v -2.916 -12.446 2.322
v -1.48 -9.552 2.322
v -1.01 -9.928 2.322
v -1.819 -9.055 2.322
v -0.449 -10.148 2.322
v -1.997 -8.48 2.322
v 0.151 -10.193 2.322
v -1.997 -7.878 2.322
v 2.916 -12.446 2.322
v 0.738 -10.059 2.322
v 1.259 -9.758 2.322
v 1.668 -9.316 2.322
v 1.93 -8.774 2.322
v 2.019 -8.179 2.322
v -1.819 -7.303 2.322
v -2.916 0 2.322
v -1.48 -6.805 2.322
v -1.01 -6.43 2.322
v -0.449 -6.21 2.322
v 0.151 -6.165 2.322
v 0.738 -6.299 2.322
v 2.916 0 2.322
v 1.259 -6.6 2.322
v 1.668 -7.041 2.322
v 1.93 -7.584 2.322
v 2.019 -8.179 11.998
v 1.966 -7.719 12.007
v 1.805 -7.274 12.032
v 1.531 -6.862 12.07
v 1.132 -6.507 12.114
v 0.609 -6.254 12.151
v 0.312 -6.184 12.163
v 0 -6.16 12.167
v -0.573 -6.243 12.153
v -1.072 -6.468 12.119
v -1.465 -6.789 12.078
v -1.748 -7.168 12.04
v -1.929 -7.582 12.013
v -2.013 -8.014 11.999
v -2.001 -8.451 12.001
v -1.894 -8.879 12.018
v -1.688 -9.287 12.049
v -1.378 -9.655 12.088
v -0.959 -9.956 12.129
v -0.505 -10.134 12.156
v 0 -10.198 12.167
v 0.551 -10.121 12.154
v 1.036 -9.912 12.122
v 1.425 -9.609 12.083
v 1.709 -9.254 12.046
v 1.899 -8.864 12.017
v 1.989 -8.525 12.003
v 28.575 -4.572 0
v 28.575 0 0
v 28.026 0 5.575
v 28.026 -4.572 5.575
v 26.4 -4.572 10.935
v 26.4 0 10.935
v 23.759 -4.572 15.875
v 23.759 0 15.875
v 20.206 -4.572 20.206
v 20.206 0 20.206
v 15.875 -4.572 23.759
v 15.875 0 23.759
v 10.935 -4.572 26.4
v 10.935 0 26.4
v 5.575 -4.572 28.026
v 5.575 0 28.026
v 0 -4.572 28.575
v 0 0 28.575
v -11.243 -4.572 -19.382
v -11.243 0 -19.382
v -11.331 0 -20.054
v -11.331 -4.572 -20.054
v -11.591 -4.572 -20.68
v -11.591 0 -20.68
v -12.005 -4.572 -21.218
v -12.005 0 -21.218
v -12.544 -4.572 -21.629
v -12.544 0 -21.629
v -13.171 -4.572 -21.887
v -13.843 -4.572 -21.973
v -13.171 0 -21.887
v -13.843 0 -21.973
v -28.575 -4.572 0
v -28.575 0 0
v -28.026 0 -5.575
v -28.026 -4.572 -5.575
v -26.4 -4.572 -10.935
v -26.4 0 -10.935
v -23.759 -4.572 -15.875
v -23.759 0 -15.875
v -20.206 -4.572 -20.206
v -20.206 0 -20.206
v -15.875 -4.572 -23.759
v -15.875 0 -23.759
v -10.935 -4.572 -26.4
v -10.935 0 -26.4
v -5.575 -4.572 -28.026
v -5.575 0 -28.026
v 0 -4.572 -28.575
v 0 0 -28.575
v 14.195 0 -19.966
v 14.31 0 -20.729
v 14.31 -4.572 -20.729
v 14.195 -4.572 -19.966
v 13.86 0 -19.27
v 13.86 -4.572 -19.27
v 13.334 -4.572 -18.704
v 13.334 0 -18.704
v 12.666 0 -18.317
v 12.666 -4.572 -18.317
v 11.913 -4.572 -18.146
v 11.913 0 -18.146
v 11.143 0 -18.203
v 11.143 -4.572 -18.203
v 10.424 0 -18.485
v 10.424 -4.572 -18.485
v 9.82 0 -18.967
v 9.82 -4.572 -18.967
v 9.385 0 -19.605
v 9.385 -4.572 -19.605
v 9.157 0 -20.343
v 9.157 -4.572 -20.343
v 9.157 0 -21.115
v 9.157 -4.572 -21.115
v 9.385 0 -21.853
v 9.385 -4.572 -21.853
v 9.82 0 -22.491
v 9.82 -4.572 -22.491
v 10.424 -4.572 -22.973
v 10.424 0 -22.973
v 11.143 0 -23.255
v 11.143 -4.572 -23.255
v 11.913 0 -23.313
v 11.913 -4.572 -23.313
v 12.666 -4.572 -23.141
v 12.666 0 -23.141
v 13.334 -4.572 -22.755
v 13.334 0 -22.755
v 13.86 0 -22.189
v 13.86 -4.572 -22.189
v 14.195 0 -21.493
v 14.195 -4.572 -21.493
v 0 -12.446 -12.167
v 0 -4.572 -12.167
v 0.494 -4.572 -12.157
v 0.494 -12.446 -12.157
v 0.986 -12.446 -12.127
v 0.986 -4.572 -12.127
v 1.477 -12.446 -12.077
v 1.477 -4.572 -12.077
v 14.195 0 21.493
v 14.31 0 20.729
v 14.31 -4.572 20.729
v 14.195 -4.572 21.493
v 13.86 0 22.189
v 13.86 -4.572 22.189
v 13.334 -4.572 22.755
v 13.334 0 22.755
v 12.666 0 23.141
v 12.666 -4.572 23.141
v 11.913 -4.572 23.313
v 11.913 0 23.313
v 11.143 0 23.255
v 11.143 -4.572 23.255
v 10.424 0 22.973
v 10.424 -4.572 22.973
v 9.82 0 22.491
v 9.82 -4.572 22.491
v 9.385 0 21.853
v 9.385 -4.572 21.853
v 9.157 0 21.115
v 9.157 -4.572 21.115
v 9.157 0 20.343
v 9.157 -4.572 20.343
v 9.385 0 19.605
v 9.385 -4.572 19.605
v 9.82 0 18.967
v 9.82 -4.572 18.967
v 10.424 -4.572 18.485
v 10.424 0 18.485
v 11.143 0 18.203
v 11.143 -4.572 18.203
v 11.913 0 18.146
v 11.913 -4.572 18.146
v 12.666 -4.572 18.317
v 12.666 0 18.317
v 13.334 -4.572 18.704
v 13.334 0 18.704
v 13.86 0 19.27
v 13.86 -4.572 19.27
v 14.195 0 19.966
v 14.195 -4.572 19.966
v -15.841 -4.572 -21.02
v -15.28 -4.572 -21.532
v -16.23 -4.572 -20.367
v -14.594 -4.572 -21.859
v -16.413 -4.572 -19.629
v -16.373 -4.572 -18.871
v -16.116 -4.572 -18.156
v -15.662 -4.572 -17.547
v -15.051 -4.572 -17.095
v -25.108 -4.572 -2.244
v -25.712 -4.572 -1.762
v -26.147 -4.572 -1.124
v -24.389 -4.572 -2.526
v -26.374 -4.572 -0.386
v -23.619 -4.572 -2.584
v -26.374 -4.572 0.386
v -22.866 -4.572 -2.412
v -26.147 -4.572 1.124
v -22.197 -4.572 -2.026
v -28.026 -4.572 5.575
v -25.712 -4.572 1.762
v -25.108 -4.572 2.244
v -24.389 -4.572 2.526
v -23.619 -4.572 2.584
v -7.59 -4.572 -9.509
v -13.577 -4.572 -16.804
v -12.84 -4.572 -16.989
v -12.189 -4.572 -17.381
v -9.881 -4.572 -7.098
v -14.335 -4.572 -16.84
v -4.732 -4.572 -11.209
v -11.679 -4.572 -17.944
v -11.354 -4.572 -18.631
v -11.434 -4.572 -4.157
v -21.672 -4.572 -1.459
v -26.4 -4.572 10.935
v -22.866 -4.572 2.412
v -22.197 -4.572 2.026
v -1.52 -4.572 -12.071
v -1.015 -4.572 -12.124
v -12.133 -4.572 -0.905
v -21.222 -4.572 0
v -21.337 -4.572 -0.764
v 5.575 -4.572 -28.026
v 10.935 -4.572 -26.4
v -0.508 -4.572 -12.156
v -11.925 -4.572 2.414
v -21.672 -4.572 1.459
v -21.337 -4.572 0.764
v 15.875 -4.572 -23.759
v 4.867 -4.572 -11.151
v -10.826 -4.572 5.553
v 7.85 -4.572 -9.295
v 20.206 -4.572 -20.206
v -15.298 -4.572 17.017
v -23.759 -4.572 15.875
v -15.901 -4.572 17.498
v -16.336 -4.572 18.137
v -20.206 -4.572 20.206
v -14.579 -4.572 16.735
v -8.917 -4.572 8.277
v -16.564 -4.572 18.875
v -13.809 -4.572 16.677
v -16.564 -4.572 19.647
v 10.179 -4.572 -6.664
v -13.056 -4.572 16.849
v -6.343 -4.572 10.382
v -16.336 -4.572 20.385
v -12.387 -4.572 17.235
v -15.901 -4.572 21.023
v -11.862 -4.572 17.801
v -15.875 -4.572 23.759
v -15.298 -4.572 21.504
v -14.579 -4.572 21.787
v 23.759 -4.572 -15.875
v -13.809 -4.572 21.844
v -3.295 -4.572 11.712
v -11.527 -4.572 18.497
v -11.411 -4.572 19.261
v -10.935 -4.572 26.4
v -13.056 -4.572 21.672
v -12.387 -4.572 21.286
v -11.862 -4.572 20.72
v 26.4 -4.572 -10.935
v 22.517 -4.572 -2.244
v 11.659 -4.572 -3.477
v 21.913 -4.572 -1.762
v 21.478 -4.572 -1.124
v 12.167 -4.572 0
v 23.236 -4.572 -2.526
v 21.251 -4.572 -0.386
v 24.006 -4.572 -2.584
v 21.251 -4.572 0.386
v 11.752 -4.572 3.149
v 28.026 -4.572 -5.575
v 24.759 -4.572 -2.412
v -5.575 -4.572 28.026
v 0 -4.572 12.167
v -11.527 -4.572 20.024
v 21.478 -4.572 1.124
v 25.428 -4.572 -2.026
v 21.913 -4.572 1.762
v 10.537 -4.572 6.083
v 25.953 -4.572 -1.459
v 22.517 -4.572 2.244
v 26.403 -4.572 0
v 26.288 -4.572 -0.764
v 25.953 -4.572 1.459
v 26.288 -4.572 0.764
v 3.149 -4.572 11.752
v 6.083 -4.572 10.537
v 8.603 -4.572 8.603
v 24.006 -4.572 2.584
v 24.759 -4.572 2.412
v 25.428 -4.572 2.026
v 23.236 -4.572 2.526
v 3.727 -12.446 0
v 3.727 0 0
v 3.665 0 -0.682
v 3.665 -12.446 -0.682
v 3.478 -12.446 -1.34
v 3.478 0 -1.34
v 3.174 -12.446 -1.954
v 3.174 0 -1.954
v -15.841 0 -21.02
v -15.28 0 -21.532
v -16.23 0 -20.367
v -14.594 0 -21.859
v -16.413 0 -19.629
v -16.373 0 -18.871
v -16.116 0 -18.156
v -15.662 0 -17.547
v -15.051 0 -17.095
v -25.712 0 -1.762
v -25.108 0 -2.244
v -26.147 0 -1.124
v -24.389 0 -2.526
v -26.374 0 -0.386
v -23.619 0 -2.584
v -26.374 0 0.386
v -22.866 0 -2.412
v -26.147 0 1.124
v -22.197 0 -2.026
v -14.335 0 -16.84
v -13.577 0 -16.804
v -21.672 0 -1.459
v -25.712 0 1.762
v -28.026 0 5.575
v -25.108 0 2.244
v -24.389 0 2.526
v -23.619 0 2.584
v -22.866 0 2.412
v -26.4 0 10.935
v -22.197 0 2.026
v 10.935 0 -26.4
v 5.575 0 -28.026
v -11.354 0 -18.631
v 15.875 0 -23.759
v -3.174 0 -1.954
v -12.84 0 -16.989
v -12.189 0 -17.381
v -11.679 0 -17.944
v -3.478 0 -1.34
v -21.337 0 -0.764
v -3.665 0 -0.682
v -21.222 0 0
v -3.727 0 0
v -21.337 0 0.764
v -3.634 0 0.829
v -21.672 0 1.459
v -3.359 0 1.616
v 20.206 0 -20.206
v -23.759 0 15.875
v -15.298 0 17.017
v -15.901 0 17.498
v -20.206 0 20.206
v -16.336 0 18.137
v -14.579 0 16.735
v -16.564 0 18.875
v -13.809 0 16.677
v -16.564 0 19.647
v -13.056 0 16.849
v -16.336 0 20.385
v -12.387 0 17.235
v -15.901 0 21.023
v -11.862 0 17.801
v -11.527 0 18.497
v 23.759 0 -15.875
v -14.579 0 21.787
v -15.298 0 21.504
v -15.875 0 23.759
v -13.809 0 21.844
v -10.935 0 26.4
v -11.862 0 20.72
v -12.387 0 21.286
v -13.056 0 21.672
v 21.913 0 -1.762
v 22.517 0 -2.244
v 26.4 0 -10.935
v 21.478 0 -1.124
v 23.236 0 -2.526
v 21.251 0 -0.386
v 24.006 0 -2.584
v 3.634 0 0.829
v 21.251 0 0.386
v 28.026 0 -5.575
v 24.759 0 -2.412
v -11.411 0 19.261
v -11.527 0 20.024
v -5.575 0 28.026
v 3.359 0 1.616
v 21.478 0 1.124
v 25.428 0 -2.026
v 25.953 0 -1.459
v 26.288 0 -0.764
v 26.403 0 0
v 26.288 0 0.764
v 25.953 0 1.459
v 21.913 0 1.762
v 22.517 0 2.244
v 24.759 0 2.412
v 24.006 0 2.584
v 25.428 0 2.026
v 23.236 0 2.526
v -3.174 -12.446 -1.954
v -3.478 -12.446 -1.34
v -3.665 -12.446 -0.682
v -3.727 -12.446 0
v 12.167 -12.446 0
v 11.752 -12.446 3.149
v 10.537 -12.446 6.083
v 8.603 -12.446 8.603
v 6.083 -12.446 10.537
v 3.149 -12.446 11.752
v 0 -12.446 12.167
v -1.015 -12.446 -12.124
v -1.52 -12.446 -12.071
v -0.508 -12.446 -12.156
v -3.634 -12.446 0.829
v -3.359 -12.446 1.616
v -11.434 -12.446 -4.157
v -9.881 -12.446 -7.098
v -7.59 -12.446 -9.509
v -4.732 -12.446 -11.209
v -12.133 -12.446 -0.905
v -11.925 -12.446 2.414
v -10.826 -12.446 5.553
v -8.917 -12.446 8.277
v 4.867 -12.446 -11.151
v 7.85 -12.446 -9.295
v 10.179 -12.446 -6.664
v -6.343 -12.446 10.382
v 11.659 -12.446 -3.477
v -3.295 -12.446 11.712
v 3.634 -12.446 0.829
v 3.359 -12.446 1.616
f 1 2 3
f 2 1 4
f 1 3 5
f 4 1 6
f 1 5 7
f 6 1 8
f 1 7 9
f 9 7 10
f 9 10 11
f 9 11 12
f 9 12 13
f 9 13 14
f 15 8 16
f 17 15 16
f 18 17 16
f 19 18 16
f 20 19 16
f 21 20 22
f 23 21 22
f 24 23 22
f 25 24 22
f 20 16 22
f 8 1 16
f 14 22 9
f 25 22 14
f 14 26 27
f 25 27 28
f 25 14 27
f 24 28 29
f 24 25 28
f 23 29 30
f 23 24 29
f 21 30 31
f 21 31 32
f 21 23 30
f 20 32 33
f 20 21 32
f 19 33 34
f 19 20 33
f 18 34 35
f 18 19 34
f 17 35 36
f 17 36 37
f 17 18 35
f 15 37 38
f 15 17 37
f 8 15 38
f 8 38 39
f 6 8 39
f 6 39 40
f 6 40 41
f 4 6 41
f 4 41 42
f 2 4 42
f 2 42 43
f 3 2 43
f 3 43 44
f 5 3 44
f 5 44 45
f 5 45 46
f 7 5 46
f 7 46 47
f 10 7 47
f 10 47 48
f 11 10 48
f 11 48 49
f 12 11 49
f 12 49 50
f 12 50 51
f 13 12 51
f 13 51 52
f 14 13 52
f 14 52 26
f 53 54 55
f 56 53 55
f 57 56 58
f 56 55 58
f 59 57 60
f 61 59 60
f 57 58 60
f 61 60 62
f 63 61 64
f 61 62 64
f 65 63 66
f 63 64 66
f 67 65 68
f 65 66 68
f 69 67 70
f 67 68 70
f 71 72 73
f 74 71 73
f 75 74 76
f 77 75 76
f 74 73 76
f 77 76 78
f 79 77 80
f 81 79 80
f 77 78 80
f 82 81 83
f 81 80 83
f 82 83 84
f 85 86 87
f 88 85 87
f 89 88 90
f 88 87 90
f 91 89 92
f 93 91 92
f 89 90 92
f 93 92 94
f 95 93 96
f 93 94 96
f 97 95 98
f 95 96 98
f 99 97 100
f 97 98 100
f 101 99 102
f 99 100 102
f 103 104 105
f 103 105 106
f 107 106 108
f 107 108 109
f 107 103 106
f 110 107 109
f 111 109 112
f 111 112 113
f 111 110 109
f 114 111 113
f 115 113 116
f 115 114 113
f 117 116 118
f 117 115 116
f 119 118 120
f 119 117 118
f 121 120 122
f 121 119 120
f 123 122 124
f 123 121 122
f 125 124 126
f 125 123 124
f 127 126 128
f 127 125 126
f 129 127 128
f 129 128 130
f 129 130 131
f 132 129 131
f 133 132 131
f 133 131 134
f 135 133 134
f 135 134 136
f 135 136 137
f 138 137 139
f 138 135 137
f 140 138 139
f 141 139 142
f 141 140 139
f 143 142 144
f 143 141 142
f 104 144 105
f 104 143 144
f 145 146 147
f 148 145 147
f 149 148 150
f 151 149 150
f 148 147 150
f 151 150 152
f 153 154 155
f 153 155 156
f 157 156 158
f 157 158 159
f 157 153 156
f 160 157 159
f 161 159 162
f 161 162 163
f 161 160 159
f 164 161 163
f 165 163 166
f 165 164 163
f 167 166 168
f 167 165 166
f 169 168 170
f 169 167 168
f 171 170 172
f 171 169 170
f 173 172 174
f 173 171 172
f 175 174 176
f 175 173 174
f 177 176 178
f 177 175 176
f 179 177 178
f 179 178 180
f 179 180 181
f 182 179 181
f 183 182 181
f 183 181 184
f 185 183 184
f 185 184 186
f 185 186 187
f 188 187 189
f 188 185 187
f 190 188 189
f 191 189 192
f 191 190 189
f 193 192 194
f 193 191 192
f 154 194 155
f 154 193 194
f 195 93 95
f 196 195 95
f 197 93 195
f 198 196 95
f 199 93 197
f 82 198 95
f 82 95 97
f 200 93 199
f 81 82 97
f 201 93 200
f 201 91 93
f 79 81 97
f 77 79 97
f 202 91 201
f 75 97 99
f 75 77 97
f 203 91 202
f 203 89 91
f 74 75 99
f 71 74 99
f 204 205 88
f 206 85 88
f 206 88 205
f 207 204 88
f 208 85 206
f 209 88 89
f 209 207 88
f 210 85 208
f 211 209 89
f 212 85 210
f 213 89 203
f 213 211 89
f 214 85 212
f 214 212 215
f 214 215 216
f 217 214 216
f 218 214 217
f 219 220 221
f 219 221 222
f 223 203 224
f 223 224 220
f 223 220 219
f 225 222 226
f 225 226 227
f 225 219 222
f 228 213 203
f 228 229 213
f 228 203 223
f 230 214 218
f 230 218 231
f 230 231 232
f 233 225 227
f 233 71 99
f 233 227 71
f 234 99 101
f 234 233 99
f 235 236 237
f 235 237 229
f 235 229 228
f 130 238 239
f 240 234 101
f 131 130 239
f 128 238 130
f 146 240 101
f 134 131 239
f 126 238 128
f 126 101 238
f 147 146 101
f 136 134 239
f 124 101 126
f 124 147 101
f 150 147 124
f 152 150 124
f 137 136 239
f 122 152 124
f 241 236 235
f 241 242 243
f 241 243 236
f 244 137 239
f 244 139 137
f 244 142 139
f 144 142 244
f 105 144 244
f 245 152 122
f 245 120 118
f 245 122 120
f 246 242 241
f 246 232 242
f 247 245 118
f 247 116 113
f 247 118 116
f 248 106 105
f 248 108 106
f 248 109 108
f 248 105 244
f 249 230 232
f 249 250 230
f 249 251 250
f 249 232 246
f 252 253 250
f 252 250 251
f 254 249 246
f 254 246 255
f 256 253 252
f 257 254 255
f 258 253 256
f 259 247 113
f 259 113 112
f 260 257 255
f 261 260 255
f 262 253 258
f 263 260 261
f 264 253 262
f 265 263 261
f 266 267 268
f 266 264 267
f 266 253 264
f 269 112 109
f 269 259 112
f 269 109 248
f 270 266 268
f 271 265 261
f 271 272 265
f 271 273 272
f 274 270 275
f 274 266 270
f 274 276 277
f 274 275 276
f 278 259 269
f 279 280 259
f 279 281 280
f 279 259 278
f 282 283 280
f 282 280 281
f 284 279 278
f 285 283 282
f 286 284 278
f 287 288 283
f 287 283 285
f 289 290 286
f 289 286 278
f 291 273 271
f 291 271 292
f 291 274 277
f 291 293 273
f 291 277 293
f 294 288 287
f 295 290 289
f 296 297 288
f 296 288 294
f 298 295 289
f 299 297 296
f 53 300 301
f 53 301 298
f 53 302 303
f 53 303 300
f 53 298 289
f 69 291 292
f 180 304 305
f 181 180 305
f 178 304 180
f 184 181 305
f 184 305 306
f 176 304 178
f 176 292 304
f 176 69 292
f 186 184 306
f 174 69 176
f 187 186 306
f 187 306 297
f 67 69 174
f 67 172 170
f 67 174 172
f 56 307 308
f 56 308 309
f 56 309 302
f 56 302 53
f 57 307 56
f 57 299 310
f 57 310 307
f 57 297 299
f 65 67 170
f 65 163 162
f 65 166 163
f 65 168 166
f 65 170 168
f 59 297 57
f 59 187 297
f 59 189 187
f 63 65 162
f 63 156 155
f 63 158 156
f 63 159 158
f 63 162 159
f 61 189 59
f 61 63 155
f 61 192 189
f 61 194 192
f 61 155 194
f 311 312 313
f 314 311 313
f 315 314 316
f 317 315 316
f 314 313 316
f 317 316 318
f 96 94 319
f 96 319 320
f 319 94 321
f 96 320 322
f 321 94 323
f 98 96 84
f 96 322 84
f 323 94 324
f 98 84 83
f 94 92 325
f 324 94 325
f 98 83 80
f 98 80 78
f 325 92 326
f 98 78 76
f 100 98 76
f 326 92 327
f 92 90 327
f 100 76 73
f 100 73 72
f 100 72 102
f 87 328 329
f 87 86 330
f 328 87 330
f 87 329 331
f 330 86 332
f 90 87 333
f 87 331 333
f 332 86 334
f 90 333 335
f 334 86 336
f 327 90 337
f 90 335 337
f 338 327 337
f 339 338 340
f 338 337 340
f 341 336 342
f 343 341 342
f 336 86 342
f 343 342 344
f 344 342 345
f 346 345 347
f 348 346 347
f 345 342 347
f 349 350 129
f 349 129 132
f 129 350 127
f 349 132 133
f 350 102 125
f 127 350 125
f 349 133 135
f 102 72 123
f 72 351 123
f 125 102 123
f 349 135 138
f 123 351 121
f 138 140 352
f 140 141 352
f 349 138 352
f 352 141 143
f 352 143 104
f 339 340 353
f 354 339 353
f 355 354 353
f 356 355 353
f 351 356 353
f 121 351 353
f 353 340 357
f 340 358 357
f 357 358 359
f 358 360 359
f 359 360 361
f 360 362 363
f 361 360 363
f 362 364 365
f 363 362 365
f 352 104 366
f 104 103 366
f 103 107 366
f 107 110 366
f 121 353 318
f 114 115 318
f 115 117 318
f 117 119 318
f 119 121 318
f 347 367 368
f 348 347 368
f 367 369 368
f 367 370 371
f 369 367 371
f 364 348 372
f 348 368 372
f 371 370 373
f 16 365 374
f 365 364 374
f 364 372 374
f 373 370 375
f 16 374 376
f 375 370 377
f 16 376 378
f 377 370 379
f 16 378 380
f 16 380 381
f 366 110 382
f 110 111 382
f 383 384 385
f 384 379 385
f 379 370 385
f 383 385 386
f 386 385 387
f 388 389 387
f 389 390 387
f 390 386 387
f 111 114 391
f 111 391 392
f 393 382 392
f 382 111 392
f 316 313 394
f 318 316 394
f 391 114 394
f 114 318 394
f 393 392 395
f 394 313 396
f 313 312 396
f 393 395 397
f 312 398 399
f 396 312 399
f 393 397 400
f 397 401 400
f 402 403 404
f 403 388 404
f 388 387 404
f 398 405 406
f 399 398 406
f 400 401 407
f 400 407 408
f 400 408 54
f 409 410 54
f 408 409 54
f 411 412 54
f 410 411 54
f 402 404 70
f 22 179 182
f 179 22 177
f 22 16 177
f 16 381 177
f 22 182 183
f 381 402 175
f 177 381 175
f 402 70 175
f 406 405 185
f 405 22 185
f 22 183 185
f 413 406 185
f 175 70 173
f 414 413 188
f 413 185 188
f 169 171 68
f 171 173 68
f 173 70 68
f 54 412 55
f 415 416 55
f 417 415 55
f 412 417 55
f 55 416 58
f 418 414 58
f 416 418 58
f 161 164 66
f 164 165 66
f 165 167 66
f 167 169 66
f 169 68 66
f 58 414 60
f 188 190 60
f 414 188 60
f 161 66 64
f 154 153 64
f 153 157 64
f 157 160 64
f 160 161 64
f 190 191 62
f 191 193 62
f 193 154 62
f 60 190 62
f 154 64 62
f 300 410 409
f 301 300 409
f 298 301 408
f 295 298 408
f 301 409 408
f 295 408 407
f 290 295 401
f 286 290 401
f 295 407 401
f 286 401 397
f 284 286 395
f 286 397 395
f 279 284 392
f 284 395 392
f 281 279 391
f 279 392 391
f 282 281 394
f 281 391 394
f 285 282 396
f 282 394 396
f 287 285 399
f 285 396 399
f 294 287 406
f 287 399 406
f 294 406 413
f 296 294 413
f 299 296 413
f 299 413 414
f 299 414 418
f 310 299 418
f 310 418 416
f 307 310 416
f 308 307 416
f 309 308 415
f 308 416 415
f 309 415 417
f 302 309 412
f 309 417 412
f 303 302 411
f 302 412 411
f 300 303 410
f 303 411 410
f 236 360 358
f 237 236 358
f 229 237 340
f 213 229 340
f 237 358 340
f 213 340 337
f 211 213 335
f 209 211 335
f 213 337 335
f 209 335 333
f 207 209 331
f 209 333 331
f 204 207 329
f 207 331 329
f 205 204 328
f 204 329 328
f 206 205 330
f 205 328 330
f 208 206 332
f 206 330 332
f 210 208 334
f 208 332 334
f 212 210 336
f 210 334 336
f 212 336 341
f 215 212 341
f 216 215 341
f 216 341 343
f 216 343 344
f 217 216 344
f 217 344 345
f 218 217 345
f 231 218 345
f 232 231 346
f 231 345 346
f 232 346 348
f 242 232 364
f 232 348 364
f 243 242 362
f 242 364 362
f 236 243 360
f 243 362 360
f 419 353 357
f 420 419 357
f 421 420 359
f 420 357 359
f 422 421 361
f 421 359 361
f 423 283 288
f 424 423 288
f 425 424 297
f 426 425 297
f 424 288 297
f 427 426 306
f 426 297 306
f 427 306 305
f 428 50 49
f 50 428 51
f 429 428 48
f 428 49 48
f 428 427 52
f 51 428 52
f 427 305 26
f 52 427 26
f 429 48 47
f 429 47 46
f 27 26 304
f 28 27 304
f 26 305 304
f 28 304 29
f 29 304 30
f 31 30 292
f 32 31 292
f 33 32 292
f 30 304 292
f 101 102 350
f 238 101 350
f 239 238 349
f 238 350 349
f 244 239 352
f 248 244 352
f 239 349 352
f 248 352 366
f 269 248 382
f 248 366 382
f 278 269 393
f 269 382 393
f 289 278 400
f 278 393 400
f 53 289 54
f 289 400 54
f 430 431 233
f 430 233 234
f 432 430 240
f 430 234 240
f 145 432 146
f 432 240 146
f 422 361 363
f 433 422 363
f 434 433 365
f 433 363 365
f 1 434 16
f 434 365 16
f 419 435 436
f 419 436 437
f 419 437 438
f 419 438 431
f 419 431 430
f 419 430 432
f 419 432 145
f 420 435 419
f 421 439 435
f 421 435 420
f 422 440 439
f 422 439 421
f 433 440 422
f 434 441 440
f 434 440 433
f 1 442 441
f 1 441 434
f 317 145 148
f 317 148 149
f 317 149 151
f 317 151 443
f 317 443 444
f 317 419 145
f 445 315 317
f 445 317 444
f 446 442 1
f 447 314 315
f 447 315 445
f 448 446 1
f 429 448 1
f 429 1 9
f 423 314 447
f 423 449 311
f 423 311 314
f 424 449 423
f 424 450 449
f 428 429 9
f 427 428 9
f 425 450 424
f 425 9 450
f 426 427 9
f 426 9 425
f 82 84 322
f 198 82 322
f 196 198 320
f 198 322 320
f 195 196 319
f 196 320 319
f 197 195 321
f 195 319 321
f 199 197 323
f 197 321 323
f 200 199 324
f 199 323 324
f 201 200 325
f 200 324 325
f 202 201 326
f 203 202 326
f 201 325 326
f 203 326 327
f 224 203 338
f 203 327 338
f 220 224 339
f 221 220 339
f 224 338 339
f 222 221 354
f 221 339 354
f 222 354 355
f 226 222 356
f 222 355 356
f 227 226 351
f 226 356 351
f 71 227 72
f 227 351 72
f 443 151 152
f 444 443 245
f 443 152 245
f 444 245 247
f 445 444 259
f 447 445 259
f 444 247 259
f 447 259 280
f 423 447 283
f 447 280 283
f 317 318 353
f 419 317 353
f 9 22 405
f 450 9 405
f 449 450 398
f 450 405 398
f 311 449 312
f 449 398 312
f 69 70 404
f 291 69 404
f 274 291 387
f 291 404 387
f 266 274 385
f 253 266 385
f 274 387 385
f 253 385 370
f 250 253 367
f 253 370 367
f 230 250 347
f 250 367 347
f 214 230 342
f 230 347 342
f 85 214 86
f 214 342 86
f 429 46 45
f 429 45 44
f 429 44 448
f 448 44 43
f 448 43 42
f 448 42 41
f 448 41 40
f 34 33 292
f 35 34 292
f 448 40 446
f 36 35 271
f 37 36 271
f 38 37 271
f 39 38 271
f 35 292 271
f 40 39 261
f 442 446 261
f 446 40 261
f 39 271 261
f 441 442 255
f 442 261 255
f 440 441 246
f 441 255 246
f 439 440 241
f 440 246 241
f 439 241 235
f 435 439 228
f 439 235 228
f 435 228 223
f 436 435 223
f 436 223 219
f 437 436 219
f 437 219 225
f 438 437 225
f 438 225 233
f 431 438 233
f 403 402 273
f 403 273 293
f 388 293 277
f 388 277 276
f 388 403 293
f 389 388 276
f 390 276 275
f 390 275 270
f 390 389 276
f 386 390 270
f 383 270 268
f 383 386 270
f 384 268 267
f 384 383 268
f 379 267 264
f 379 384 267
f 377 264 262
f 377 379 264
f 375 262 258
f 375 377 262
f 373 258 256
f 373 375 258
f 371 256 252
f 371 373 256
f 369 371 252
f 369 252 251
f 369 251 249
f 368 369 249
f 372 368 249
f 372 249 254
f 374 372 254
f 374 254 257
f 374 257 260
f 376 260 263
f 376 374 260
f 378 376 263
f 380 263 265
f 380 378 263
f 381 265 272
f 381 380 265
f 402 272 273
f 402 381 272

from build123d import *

# Parameters (mm, degrees)
F0_R     = 2.5908
F1_DEPTH = 4.572
F2_DEPTH = 12.446
F3_R     = 2.0193
F4_DEPTH = 50.8


with BuildPart() as f1:
    # F0 (on Front) → F1 (new body)
    with BuildSketch(Plane.XZ):
        with BuildLine():
            Line((26.4033, 0), (28.575, 0))
            ThreePointArc((28.575, 0), (20.2055762724, 20.2055762724), (0, 28.575))
            Line((0, 28.575), (0, 12.1666))
            ThreePointArc((0, 12.1666), (8.603085364, 8.603085364), (12.1666, 0))
            Line((12.1666, 0), (21.2217, 0))
            ThreePointArc((21.2217, 0), (23.8125, 2.5908), (26.4033, 0))
        make_face()
        with Locations((11.7190584855, 20.7291780943)):
            Circle(F0_R, mode=Mode.SUBTRACT)
        with BuildLine():
            ThreePointArc((0, -28.575), (20.2055762724, -20.2055762724), (28.575, 0))
            Line((28.575, 0), (26.4033, 0))
            ThreePointArc((26.4033, 0), (23.8125, -2.5908), (21.2217, 0))
            Line((21.2217, 0), (12.1666, 0))
            ThreePointArc((12.1666, 0), (9.1104172738, -8.0638981055), (1.4772615395, -12.0765828736))
            ThreePointArc((1.4772615395, -12.0765828736), (0.7400008006, -12.144074867), (0, -12.1666))
            Line((0, -12.1666), (0, -28.575))
        make_face()
        with Locations((11.7190584855, -20.7291780943)):
            Circle(F0_R, mode=Mode.SUBTRACT)
        with BuildLine():
            Line((0, 12.1666), (0, 28.575))
            ThreePointArc((0, 28.575), (-20.2055762724, 20.2055762724), (-28.575, 0))
            Line((-28.575, 0), (-26.4033, 0))
            ThreePointArc((-26.4033, 0), (-23.8125, 2.5908), (-21.2217, 0))
            Line((-21.2217, 0), (-12.1666, 0))
            ThreePointArc((-12.1666, 0), (-8.603085364, 8.603085364), (0, 12.1666))
        make_face()
        with Locations((-14.0022196536, 19.260659413)):
            Circle(F0_R, mode=Mode.SUBTRACT)
        with BuildLine():
            ThreePointArc((-28.575, 0), (-20.2055762724, -20.2055762724), (0, -28.575))
            Line((0, -28.575), (0, -12.1666))
            ThreePointArc((0, -12.1666), (-0.7613836332, -12.1427530043), (-1.5197825851, -12.0713054992))
            ThreePointArc((-1.5197825851, -12.0713054992), (-9.1246025217, -8.0478434615), (-12.1666, 0))
            Line((-12.1666, 0), (-21.2217, 0))
            ThreePointArc((-21.2217, 0), (-23.8125, -2.5908), (-26.4033, 0))
            Line((-26.4033, 0), (-28.575, 0))
        make_face()
        with BuildLine():
            ThreePointArc((-13.8432016041, -21.9729224119), (-15.6621403898, -17.5467676407), (-11.2427748724, -19.3821402972))
            ThreePointArc((-11.2427748724, -19.3821402972), (-12.0050093549, -21.2175129537), (-13.8432016041, -21.9729224119))
        make_face(mode=Mode.SUBTRACT)
    extrude(amount=F1_DEPTH)

    # F0 (on Front) → F2 (join)
    with BuildSketch(Plane.XZ):
        with BuildLine():
            Line((-3.72745, 0), (-12.1666, 0))
            ThreePointArc((-12.1666, 0), (-9.1246025217, -8.0478434615), (-1.5197825851, -12.0713054992))
            Line((-1.5197825851, -12.0713054992), (-1.5197825851, -1.9539885713))
            Line((-1.5197825851, -1.9539885713), (-3.1742419829, -1.9539885713))
            ThreePointArc((-3.1742419829, -1.9539885713), (-3.586482384, -1.0153952982), (-3.72745, 0))
        make_face()
        with BuildLine():
            ThreePointArc((1.4772615395, -12.0765828736), (9.1104172738, -8.0638981055), (12.1666, 0))
            Line((12.1666, 0), (3.72745, 0))
            ThreePointArc((3.72745, 0), (3.586482384, -1.0153952982), (3.1742419829, -1.9539885713))
            Line((3.1742419829, -1.9539885713), (1.4772615395, -1.9539885713))
            Line((1.4772615395, -1.9539885713), (1.4772615395, -12.0765828736))
        make_face()
        with BuildLine():
            ThreePointArc((12.1666, 0), (8.603085364, 8.603085364), (0, 12.1666))
            Line((0, 12.1666), (0, 2.3218799357))
            Line((0, 2.3218799357), (2.9159487421, 2.3218799357))
            ThreePointArc((2.9159487421, 2.3218799357), (3.5187310668, 1.2298029036), (3.72745, 0))
            Line((3.72745, 0), (12.1666, 0))
        make_face()
        with BuildLine():
            Line((0, 2.3218799357), (0, 12.1666))
            ThreePointArc((0, 12.1666), (-8.603085364, 8.603085364), (-12.1666, 0))
            Line((-12.1666, 0), (-3.72745, 0))
            ThreePointArc((-3.72745, 0), (-3.5187310668, 1.2298029036), (-2.9159487421, 2.3218799357))
            Line((-2.9159487421, 2.3218799357), (0, 2.3218799357))
        make_face()
        with BuildLine():
            Line((0, -1.9539885713), (0, -12.1666))
            ThreePointArc((0, -12.1666), (0.7400008006, -12.144074867), (1.4772615395, -12.0765828736))
            Line((1.4772615395, -12.0765828736), (1.4772615395, -1.9539885713))
            Line((1.4772615395, -1.9539885713), (0, -1.9539885713))
        make_face()
        with BuildLine():
            ThreePointArc((-1.5197825851, -12.0713054992), (-0.7613836332, -12.1427530043), (0, -12.1666))
            Line((0, -12.1666), (0, -1.9539885713))
            Line((0, -1.9539885713), (-1.5197825851, -1.9539885713))
            Line((-1.5197825851, -1.9539885713), (-1.5197825851, -12.0713054992))
        make_face()
    extrude(amount=F2_DEPTH)

    # F3 (on Top) → F4 (cut)
    with BuildSketch(Plane.XY):
        with Locations((0, -8.1789378586)):
            Circle(F3_R)
    extrude(amount=F4_DEPTH, mode=Mode.SUBTRACT)


solid = f1.part
